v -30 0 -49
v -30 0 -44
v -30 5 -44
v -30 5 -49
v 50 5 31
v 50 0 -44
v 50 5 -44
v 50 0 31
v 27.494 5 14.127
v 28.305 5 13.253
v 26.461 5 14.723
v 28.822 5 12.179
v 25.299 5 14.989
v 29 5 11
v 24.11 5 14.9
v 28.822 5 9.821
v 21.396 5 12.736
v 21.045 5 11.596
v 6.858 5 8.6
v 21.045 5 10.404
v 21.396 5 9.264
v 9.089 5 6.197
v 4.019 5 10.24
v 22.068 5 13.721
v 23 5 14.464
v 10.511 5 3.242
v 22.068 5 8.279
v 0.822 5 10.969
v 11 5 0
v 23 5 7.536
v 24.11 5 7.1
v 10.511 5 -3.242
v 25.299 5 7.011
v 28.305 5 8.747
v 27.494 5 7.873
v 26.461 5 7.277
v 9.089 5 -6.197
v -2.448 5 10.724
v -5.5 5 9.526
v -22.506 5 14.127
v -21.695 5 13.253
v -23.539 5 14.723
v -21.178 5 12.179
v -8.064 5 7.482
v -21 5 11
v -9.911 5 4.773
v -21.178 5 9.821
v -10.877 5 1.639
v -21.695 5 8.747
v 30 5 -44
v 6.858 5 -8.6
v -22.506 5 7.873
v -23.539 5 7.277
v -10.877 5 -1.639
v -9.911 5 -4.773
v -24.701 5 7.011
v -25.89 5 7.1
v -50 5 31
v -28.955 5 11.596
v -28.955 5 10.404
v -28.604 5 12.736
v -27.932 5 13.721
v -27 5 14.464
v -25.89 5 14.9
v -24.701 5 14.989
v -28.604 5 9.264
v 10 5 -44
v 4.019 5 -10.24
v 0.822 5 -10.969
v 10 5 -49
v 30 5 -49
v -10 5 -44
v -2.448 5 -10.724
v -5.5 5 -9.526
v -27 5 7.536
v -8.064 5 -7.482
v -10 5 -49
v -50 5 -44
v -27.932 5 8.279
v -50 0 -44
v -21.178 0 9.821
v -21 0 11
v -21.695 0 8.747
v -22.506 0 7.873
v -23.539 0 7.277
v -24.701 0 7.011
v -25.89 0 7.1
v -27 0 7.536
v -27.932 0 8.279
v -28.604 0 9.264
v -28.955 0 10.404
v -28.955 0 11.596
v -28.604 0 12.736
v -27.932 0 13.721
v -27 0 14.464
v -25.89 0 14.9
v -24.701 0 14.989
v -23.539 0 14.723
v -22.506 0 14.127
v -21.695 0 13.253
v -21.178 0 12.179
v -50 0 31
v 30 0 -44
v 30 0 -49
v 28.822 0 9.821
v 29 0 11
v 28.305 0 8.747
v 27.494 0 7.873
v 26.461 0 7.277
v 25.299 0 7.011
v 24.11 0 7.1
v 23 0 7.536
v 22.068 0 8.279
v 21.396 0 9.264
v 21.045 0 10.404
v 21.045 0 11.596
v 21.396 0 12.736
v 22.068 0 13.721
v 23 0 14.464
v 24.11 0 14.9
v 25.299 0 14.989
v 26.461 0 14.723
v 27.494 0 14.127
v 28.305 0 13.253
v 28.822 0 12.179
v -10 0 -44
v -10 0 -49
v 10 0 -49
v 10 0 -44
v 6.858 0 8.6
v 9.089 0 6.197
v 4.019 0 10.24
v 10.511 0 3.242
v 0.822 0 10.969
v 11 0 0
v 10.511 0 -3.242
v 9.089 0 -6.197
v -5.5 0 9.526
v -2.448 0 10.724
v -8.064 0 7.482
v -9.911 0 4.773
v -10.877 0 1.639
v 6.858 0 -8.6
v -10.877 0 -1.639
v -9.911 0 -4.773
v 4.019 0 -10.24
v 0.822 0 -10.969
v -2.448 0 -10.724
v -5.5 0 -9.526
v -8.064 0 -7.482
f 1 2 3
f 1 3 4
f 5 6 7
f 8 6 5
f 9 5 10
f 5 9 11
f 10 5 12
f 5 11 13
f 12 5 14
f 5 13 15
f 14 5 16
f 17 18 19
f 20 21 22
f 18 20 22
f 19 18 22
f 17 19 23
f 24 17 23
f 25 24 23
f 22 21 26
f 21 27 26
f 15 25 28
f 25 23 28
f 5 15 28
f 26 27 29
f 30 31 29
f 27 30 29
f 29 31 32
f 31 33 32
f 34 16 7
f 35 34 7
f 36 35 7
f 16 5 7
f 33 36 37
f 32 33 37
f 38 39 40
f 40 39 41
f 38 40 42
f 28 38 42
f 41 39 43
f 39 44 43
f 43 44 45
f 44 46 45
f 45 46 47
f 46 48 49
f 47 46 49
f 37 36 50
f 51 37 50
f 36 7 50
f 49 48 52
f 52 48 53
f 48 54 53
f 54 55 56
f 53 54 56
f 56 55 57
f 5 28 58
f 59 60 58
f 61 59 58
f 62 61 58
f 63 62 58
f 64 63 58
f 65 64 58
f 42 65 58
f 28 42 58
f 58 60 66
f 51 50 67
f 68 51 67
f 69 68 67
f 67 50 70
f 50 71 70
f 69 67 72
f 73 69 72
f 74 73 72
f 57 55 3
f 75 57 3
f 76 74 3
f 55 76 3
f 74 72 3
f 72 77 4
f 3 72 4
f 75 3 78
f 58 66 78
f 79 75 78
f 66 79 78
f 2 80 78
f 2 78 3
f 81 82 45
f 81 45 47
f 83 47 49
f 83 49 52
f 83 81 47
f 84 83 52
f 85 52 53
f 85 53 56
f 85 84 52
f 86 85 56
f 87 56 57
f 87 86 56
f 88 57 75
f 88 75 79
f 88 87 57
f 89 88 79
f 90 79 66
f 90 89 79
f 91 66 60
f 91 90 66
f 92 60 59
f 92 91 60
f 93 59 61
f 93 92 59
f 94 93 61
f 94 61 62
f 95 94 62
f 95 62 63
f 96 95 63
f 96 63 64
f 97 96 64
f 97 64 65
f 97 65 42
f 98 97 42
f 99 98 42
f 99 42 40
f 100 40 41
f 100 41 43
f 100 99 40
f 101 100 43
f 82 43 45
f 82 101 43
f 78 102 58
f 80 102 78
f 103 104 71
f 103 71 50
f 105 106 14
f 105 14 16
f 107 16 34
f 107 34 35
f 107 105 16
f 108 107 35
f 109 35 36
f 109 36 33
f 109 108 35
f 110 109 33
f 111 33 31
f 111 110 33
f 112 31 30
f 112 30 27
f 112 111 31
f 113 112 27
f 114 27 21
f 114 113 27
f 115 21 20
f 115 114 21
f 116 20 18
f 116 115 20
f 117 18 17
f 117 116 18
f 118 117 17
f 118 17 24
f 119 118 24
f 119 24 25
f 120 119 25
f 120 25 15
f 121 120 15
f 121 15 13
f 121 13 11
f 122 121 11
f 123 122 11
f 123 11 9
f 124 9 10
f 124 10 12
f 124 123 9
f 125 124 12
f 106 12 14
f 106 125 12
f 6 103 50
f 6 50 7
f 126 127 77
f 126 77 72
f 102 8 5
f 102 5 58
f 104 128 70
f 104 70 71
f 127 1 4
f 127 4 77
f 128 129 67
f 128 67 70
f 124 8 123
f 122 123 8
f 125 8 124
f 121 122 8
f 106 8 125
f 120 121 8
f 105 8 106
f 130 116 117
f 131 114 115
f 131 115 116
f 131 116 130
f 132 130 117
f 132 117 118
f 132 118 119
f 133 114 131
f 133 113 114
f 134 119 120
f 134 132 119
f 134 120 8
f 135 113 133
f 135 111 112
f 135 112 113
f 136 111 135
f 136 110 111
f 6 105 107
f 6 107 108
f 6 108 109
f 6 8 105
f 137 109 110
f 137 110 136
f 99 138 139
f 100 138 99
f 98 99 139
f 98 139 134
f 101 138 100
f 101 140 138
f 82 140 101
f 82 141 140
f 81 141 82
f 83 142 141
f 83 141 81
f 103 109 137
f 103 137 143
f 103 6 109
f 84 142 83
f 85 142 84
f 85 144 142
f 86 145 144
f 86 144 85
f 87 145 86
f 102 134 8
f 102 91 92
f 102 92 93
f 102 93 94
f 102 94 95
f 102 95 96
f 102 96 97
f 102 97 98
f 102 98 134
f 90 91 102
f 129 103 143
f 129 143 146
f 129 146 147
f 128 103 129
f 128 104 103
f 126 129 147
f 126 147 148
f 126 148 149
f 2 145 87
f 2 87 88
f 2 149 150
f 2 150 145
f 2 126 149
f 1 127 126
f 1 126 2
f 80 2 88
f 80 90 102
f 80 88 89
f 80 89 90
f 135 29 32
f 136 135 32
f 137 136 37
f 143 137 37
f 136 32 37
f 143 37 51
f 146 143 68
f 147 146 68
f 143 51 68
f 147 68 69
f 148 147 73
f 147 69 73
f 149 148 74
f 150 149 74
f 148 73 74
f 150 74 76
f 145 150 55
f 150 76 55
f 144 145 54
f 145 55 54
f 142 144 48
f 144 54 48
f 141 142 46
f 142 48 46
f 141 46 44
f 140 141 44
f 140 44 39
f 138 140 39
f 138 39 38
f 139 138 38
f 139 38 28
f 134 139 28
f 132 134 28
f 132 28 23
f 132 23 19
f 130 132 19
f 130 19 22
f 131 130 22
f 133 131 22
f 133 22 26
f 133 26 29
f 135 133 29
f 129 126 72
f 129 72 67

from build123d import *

# Parameters (mm, degrees)
SKETCH1_R           = 4
BOSS_EXTRUDE1_DEPTH = 5
CUT_EXTRUDE1_REACH  = 7
SKETCH2_R           = 11


with BuildPart() as part:
    # Sketch1 → Boss-Extrude1 (new body)
    with BuildSketch(Plane(origin=(0, 0, 0), x_dir=(1, 0, 0), z_dir=(0, 1, 0))):
        Polygon((-50, 44), (-30, 44), (-30, 49), (-10, 49), (-10, 44), (10, 44), (10, 49), (30, 49), (30, 44), (50, 44), (50, -31), (-50, -31), align=None)
        Circle(SKETCH1_R, mode=Mode.SUBTRACT)
        with Locations((25, -11)):
            Circle(SKETCH1_R, mode=Mode.SUBTRACT)
        with Locations((-25, -11)):
            Circle(SKETCH1_R, mode=Mode.SUBTRACT)
    extrude(amount=BOSS_EXTRUDE1_DEPTH)

    # Sketch2 → Cut-Extrude1 (cut, up to next)
    with BuildSketch(Plane(origin=(0, 5, 0), x_dir=(1, 0, 0), z_dir=(0, 1, 0)), mode=Mode.PRIVATE) as cut_extrude1_sk1:
        Circle(SKETCH2_R)
    cut_extrude1_tool1 = extrude(cut_extrude1_sk1.sketch, amount=-CUT_EXTRUDE1_REACH, mode=Mode.PRIVATE) & part.part
    add(cut_extrude1_tool1.solids().sort_by_distance((0, 5, 0))[0], mode=Mode.SUBTRACT)


solid = part.part
